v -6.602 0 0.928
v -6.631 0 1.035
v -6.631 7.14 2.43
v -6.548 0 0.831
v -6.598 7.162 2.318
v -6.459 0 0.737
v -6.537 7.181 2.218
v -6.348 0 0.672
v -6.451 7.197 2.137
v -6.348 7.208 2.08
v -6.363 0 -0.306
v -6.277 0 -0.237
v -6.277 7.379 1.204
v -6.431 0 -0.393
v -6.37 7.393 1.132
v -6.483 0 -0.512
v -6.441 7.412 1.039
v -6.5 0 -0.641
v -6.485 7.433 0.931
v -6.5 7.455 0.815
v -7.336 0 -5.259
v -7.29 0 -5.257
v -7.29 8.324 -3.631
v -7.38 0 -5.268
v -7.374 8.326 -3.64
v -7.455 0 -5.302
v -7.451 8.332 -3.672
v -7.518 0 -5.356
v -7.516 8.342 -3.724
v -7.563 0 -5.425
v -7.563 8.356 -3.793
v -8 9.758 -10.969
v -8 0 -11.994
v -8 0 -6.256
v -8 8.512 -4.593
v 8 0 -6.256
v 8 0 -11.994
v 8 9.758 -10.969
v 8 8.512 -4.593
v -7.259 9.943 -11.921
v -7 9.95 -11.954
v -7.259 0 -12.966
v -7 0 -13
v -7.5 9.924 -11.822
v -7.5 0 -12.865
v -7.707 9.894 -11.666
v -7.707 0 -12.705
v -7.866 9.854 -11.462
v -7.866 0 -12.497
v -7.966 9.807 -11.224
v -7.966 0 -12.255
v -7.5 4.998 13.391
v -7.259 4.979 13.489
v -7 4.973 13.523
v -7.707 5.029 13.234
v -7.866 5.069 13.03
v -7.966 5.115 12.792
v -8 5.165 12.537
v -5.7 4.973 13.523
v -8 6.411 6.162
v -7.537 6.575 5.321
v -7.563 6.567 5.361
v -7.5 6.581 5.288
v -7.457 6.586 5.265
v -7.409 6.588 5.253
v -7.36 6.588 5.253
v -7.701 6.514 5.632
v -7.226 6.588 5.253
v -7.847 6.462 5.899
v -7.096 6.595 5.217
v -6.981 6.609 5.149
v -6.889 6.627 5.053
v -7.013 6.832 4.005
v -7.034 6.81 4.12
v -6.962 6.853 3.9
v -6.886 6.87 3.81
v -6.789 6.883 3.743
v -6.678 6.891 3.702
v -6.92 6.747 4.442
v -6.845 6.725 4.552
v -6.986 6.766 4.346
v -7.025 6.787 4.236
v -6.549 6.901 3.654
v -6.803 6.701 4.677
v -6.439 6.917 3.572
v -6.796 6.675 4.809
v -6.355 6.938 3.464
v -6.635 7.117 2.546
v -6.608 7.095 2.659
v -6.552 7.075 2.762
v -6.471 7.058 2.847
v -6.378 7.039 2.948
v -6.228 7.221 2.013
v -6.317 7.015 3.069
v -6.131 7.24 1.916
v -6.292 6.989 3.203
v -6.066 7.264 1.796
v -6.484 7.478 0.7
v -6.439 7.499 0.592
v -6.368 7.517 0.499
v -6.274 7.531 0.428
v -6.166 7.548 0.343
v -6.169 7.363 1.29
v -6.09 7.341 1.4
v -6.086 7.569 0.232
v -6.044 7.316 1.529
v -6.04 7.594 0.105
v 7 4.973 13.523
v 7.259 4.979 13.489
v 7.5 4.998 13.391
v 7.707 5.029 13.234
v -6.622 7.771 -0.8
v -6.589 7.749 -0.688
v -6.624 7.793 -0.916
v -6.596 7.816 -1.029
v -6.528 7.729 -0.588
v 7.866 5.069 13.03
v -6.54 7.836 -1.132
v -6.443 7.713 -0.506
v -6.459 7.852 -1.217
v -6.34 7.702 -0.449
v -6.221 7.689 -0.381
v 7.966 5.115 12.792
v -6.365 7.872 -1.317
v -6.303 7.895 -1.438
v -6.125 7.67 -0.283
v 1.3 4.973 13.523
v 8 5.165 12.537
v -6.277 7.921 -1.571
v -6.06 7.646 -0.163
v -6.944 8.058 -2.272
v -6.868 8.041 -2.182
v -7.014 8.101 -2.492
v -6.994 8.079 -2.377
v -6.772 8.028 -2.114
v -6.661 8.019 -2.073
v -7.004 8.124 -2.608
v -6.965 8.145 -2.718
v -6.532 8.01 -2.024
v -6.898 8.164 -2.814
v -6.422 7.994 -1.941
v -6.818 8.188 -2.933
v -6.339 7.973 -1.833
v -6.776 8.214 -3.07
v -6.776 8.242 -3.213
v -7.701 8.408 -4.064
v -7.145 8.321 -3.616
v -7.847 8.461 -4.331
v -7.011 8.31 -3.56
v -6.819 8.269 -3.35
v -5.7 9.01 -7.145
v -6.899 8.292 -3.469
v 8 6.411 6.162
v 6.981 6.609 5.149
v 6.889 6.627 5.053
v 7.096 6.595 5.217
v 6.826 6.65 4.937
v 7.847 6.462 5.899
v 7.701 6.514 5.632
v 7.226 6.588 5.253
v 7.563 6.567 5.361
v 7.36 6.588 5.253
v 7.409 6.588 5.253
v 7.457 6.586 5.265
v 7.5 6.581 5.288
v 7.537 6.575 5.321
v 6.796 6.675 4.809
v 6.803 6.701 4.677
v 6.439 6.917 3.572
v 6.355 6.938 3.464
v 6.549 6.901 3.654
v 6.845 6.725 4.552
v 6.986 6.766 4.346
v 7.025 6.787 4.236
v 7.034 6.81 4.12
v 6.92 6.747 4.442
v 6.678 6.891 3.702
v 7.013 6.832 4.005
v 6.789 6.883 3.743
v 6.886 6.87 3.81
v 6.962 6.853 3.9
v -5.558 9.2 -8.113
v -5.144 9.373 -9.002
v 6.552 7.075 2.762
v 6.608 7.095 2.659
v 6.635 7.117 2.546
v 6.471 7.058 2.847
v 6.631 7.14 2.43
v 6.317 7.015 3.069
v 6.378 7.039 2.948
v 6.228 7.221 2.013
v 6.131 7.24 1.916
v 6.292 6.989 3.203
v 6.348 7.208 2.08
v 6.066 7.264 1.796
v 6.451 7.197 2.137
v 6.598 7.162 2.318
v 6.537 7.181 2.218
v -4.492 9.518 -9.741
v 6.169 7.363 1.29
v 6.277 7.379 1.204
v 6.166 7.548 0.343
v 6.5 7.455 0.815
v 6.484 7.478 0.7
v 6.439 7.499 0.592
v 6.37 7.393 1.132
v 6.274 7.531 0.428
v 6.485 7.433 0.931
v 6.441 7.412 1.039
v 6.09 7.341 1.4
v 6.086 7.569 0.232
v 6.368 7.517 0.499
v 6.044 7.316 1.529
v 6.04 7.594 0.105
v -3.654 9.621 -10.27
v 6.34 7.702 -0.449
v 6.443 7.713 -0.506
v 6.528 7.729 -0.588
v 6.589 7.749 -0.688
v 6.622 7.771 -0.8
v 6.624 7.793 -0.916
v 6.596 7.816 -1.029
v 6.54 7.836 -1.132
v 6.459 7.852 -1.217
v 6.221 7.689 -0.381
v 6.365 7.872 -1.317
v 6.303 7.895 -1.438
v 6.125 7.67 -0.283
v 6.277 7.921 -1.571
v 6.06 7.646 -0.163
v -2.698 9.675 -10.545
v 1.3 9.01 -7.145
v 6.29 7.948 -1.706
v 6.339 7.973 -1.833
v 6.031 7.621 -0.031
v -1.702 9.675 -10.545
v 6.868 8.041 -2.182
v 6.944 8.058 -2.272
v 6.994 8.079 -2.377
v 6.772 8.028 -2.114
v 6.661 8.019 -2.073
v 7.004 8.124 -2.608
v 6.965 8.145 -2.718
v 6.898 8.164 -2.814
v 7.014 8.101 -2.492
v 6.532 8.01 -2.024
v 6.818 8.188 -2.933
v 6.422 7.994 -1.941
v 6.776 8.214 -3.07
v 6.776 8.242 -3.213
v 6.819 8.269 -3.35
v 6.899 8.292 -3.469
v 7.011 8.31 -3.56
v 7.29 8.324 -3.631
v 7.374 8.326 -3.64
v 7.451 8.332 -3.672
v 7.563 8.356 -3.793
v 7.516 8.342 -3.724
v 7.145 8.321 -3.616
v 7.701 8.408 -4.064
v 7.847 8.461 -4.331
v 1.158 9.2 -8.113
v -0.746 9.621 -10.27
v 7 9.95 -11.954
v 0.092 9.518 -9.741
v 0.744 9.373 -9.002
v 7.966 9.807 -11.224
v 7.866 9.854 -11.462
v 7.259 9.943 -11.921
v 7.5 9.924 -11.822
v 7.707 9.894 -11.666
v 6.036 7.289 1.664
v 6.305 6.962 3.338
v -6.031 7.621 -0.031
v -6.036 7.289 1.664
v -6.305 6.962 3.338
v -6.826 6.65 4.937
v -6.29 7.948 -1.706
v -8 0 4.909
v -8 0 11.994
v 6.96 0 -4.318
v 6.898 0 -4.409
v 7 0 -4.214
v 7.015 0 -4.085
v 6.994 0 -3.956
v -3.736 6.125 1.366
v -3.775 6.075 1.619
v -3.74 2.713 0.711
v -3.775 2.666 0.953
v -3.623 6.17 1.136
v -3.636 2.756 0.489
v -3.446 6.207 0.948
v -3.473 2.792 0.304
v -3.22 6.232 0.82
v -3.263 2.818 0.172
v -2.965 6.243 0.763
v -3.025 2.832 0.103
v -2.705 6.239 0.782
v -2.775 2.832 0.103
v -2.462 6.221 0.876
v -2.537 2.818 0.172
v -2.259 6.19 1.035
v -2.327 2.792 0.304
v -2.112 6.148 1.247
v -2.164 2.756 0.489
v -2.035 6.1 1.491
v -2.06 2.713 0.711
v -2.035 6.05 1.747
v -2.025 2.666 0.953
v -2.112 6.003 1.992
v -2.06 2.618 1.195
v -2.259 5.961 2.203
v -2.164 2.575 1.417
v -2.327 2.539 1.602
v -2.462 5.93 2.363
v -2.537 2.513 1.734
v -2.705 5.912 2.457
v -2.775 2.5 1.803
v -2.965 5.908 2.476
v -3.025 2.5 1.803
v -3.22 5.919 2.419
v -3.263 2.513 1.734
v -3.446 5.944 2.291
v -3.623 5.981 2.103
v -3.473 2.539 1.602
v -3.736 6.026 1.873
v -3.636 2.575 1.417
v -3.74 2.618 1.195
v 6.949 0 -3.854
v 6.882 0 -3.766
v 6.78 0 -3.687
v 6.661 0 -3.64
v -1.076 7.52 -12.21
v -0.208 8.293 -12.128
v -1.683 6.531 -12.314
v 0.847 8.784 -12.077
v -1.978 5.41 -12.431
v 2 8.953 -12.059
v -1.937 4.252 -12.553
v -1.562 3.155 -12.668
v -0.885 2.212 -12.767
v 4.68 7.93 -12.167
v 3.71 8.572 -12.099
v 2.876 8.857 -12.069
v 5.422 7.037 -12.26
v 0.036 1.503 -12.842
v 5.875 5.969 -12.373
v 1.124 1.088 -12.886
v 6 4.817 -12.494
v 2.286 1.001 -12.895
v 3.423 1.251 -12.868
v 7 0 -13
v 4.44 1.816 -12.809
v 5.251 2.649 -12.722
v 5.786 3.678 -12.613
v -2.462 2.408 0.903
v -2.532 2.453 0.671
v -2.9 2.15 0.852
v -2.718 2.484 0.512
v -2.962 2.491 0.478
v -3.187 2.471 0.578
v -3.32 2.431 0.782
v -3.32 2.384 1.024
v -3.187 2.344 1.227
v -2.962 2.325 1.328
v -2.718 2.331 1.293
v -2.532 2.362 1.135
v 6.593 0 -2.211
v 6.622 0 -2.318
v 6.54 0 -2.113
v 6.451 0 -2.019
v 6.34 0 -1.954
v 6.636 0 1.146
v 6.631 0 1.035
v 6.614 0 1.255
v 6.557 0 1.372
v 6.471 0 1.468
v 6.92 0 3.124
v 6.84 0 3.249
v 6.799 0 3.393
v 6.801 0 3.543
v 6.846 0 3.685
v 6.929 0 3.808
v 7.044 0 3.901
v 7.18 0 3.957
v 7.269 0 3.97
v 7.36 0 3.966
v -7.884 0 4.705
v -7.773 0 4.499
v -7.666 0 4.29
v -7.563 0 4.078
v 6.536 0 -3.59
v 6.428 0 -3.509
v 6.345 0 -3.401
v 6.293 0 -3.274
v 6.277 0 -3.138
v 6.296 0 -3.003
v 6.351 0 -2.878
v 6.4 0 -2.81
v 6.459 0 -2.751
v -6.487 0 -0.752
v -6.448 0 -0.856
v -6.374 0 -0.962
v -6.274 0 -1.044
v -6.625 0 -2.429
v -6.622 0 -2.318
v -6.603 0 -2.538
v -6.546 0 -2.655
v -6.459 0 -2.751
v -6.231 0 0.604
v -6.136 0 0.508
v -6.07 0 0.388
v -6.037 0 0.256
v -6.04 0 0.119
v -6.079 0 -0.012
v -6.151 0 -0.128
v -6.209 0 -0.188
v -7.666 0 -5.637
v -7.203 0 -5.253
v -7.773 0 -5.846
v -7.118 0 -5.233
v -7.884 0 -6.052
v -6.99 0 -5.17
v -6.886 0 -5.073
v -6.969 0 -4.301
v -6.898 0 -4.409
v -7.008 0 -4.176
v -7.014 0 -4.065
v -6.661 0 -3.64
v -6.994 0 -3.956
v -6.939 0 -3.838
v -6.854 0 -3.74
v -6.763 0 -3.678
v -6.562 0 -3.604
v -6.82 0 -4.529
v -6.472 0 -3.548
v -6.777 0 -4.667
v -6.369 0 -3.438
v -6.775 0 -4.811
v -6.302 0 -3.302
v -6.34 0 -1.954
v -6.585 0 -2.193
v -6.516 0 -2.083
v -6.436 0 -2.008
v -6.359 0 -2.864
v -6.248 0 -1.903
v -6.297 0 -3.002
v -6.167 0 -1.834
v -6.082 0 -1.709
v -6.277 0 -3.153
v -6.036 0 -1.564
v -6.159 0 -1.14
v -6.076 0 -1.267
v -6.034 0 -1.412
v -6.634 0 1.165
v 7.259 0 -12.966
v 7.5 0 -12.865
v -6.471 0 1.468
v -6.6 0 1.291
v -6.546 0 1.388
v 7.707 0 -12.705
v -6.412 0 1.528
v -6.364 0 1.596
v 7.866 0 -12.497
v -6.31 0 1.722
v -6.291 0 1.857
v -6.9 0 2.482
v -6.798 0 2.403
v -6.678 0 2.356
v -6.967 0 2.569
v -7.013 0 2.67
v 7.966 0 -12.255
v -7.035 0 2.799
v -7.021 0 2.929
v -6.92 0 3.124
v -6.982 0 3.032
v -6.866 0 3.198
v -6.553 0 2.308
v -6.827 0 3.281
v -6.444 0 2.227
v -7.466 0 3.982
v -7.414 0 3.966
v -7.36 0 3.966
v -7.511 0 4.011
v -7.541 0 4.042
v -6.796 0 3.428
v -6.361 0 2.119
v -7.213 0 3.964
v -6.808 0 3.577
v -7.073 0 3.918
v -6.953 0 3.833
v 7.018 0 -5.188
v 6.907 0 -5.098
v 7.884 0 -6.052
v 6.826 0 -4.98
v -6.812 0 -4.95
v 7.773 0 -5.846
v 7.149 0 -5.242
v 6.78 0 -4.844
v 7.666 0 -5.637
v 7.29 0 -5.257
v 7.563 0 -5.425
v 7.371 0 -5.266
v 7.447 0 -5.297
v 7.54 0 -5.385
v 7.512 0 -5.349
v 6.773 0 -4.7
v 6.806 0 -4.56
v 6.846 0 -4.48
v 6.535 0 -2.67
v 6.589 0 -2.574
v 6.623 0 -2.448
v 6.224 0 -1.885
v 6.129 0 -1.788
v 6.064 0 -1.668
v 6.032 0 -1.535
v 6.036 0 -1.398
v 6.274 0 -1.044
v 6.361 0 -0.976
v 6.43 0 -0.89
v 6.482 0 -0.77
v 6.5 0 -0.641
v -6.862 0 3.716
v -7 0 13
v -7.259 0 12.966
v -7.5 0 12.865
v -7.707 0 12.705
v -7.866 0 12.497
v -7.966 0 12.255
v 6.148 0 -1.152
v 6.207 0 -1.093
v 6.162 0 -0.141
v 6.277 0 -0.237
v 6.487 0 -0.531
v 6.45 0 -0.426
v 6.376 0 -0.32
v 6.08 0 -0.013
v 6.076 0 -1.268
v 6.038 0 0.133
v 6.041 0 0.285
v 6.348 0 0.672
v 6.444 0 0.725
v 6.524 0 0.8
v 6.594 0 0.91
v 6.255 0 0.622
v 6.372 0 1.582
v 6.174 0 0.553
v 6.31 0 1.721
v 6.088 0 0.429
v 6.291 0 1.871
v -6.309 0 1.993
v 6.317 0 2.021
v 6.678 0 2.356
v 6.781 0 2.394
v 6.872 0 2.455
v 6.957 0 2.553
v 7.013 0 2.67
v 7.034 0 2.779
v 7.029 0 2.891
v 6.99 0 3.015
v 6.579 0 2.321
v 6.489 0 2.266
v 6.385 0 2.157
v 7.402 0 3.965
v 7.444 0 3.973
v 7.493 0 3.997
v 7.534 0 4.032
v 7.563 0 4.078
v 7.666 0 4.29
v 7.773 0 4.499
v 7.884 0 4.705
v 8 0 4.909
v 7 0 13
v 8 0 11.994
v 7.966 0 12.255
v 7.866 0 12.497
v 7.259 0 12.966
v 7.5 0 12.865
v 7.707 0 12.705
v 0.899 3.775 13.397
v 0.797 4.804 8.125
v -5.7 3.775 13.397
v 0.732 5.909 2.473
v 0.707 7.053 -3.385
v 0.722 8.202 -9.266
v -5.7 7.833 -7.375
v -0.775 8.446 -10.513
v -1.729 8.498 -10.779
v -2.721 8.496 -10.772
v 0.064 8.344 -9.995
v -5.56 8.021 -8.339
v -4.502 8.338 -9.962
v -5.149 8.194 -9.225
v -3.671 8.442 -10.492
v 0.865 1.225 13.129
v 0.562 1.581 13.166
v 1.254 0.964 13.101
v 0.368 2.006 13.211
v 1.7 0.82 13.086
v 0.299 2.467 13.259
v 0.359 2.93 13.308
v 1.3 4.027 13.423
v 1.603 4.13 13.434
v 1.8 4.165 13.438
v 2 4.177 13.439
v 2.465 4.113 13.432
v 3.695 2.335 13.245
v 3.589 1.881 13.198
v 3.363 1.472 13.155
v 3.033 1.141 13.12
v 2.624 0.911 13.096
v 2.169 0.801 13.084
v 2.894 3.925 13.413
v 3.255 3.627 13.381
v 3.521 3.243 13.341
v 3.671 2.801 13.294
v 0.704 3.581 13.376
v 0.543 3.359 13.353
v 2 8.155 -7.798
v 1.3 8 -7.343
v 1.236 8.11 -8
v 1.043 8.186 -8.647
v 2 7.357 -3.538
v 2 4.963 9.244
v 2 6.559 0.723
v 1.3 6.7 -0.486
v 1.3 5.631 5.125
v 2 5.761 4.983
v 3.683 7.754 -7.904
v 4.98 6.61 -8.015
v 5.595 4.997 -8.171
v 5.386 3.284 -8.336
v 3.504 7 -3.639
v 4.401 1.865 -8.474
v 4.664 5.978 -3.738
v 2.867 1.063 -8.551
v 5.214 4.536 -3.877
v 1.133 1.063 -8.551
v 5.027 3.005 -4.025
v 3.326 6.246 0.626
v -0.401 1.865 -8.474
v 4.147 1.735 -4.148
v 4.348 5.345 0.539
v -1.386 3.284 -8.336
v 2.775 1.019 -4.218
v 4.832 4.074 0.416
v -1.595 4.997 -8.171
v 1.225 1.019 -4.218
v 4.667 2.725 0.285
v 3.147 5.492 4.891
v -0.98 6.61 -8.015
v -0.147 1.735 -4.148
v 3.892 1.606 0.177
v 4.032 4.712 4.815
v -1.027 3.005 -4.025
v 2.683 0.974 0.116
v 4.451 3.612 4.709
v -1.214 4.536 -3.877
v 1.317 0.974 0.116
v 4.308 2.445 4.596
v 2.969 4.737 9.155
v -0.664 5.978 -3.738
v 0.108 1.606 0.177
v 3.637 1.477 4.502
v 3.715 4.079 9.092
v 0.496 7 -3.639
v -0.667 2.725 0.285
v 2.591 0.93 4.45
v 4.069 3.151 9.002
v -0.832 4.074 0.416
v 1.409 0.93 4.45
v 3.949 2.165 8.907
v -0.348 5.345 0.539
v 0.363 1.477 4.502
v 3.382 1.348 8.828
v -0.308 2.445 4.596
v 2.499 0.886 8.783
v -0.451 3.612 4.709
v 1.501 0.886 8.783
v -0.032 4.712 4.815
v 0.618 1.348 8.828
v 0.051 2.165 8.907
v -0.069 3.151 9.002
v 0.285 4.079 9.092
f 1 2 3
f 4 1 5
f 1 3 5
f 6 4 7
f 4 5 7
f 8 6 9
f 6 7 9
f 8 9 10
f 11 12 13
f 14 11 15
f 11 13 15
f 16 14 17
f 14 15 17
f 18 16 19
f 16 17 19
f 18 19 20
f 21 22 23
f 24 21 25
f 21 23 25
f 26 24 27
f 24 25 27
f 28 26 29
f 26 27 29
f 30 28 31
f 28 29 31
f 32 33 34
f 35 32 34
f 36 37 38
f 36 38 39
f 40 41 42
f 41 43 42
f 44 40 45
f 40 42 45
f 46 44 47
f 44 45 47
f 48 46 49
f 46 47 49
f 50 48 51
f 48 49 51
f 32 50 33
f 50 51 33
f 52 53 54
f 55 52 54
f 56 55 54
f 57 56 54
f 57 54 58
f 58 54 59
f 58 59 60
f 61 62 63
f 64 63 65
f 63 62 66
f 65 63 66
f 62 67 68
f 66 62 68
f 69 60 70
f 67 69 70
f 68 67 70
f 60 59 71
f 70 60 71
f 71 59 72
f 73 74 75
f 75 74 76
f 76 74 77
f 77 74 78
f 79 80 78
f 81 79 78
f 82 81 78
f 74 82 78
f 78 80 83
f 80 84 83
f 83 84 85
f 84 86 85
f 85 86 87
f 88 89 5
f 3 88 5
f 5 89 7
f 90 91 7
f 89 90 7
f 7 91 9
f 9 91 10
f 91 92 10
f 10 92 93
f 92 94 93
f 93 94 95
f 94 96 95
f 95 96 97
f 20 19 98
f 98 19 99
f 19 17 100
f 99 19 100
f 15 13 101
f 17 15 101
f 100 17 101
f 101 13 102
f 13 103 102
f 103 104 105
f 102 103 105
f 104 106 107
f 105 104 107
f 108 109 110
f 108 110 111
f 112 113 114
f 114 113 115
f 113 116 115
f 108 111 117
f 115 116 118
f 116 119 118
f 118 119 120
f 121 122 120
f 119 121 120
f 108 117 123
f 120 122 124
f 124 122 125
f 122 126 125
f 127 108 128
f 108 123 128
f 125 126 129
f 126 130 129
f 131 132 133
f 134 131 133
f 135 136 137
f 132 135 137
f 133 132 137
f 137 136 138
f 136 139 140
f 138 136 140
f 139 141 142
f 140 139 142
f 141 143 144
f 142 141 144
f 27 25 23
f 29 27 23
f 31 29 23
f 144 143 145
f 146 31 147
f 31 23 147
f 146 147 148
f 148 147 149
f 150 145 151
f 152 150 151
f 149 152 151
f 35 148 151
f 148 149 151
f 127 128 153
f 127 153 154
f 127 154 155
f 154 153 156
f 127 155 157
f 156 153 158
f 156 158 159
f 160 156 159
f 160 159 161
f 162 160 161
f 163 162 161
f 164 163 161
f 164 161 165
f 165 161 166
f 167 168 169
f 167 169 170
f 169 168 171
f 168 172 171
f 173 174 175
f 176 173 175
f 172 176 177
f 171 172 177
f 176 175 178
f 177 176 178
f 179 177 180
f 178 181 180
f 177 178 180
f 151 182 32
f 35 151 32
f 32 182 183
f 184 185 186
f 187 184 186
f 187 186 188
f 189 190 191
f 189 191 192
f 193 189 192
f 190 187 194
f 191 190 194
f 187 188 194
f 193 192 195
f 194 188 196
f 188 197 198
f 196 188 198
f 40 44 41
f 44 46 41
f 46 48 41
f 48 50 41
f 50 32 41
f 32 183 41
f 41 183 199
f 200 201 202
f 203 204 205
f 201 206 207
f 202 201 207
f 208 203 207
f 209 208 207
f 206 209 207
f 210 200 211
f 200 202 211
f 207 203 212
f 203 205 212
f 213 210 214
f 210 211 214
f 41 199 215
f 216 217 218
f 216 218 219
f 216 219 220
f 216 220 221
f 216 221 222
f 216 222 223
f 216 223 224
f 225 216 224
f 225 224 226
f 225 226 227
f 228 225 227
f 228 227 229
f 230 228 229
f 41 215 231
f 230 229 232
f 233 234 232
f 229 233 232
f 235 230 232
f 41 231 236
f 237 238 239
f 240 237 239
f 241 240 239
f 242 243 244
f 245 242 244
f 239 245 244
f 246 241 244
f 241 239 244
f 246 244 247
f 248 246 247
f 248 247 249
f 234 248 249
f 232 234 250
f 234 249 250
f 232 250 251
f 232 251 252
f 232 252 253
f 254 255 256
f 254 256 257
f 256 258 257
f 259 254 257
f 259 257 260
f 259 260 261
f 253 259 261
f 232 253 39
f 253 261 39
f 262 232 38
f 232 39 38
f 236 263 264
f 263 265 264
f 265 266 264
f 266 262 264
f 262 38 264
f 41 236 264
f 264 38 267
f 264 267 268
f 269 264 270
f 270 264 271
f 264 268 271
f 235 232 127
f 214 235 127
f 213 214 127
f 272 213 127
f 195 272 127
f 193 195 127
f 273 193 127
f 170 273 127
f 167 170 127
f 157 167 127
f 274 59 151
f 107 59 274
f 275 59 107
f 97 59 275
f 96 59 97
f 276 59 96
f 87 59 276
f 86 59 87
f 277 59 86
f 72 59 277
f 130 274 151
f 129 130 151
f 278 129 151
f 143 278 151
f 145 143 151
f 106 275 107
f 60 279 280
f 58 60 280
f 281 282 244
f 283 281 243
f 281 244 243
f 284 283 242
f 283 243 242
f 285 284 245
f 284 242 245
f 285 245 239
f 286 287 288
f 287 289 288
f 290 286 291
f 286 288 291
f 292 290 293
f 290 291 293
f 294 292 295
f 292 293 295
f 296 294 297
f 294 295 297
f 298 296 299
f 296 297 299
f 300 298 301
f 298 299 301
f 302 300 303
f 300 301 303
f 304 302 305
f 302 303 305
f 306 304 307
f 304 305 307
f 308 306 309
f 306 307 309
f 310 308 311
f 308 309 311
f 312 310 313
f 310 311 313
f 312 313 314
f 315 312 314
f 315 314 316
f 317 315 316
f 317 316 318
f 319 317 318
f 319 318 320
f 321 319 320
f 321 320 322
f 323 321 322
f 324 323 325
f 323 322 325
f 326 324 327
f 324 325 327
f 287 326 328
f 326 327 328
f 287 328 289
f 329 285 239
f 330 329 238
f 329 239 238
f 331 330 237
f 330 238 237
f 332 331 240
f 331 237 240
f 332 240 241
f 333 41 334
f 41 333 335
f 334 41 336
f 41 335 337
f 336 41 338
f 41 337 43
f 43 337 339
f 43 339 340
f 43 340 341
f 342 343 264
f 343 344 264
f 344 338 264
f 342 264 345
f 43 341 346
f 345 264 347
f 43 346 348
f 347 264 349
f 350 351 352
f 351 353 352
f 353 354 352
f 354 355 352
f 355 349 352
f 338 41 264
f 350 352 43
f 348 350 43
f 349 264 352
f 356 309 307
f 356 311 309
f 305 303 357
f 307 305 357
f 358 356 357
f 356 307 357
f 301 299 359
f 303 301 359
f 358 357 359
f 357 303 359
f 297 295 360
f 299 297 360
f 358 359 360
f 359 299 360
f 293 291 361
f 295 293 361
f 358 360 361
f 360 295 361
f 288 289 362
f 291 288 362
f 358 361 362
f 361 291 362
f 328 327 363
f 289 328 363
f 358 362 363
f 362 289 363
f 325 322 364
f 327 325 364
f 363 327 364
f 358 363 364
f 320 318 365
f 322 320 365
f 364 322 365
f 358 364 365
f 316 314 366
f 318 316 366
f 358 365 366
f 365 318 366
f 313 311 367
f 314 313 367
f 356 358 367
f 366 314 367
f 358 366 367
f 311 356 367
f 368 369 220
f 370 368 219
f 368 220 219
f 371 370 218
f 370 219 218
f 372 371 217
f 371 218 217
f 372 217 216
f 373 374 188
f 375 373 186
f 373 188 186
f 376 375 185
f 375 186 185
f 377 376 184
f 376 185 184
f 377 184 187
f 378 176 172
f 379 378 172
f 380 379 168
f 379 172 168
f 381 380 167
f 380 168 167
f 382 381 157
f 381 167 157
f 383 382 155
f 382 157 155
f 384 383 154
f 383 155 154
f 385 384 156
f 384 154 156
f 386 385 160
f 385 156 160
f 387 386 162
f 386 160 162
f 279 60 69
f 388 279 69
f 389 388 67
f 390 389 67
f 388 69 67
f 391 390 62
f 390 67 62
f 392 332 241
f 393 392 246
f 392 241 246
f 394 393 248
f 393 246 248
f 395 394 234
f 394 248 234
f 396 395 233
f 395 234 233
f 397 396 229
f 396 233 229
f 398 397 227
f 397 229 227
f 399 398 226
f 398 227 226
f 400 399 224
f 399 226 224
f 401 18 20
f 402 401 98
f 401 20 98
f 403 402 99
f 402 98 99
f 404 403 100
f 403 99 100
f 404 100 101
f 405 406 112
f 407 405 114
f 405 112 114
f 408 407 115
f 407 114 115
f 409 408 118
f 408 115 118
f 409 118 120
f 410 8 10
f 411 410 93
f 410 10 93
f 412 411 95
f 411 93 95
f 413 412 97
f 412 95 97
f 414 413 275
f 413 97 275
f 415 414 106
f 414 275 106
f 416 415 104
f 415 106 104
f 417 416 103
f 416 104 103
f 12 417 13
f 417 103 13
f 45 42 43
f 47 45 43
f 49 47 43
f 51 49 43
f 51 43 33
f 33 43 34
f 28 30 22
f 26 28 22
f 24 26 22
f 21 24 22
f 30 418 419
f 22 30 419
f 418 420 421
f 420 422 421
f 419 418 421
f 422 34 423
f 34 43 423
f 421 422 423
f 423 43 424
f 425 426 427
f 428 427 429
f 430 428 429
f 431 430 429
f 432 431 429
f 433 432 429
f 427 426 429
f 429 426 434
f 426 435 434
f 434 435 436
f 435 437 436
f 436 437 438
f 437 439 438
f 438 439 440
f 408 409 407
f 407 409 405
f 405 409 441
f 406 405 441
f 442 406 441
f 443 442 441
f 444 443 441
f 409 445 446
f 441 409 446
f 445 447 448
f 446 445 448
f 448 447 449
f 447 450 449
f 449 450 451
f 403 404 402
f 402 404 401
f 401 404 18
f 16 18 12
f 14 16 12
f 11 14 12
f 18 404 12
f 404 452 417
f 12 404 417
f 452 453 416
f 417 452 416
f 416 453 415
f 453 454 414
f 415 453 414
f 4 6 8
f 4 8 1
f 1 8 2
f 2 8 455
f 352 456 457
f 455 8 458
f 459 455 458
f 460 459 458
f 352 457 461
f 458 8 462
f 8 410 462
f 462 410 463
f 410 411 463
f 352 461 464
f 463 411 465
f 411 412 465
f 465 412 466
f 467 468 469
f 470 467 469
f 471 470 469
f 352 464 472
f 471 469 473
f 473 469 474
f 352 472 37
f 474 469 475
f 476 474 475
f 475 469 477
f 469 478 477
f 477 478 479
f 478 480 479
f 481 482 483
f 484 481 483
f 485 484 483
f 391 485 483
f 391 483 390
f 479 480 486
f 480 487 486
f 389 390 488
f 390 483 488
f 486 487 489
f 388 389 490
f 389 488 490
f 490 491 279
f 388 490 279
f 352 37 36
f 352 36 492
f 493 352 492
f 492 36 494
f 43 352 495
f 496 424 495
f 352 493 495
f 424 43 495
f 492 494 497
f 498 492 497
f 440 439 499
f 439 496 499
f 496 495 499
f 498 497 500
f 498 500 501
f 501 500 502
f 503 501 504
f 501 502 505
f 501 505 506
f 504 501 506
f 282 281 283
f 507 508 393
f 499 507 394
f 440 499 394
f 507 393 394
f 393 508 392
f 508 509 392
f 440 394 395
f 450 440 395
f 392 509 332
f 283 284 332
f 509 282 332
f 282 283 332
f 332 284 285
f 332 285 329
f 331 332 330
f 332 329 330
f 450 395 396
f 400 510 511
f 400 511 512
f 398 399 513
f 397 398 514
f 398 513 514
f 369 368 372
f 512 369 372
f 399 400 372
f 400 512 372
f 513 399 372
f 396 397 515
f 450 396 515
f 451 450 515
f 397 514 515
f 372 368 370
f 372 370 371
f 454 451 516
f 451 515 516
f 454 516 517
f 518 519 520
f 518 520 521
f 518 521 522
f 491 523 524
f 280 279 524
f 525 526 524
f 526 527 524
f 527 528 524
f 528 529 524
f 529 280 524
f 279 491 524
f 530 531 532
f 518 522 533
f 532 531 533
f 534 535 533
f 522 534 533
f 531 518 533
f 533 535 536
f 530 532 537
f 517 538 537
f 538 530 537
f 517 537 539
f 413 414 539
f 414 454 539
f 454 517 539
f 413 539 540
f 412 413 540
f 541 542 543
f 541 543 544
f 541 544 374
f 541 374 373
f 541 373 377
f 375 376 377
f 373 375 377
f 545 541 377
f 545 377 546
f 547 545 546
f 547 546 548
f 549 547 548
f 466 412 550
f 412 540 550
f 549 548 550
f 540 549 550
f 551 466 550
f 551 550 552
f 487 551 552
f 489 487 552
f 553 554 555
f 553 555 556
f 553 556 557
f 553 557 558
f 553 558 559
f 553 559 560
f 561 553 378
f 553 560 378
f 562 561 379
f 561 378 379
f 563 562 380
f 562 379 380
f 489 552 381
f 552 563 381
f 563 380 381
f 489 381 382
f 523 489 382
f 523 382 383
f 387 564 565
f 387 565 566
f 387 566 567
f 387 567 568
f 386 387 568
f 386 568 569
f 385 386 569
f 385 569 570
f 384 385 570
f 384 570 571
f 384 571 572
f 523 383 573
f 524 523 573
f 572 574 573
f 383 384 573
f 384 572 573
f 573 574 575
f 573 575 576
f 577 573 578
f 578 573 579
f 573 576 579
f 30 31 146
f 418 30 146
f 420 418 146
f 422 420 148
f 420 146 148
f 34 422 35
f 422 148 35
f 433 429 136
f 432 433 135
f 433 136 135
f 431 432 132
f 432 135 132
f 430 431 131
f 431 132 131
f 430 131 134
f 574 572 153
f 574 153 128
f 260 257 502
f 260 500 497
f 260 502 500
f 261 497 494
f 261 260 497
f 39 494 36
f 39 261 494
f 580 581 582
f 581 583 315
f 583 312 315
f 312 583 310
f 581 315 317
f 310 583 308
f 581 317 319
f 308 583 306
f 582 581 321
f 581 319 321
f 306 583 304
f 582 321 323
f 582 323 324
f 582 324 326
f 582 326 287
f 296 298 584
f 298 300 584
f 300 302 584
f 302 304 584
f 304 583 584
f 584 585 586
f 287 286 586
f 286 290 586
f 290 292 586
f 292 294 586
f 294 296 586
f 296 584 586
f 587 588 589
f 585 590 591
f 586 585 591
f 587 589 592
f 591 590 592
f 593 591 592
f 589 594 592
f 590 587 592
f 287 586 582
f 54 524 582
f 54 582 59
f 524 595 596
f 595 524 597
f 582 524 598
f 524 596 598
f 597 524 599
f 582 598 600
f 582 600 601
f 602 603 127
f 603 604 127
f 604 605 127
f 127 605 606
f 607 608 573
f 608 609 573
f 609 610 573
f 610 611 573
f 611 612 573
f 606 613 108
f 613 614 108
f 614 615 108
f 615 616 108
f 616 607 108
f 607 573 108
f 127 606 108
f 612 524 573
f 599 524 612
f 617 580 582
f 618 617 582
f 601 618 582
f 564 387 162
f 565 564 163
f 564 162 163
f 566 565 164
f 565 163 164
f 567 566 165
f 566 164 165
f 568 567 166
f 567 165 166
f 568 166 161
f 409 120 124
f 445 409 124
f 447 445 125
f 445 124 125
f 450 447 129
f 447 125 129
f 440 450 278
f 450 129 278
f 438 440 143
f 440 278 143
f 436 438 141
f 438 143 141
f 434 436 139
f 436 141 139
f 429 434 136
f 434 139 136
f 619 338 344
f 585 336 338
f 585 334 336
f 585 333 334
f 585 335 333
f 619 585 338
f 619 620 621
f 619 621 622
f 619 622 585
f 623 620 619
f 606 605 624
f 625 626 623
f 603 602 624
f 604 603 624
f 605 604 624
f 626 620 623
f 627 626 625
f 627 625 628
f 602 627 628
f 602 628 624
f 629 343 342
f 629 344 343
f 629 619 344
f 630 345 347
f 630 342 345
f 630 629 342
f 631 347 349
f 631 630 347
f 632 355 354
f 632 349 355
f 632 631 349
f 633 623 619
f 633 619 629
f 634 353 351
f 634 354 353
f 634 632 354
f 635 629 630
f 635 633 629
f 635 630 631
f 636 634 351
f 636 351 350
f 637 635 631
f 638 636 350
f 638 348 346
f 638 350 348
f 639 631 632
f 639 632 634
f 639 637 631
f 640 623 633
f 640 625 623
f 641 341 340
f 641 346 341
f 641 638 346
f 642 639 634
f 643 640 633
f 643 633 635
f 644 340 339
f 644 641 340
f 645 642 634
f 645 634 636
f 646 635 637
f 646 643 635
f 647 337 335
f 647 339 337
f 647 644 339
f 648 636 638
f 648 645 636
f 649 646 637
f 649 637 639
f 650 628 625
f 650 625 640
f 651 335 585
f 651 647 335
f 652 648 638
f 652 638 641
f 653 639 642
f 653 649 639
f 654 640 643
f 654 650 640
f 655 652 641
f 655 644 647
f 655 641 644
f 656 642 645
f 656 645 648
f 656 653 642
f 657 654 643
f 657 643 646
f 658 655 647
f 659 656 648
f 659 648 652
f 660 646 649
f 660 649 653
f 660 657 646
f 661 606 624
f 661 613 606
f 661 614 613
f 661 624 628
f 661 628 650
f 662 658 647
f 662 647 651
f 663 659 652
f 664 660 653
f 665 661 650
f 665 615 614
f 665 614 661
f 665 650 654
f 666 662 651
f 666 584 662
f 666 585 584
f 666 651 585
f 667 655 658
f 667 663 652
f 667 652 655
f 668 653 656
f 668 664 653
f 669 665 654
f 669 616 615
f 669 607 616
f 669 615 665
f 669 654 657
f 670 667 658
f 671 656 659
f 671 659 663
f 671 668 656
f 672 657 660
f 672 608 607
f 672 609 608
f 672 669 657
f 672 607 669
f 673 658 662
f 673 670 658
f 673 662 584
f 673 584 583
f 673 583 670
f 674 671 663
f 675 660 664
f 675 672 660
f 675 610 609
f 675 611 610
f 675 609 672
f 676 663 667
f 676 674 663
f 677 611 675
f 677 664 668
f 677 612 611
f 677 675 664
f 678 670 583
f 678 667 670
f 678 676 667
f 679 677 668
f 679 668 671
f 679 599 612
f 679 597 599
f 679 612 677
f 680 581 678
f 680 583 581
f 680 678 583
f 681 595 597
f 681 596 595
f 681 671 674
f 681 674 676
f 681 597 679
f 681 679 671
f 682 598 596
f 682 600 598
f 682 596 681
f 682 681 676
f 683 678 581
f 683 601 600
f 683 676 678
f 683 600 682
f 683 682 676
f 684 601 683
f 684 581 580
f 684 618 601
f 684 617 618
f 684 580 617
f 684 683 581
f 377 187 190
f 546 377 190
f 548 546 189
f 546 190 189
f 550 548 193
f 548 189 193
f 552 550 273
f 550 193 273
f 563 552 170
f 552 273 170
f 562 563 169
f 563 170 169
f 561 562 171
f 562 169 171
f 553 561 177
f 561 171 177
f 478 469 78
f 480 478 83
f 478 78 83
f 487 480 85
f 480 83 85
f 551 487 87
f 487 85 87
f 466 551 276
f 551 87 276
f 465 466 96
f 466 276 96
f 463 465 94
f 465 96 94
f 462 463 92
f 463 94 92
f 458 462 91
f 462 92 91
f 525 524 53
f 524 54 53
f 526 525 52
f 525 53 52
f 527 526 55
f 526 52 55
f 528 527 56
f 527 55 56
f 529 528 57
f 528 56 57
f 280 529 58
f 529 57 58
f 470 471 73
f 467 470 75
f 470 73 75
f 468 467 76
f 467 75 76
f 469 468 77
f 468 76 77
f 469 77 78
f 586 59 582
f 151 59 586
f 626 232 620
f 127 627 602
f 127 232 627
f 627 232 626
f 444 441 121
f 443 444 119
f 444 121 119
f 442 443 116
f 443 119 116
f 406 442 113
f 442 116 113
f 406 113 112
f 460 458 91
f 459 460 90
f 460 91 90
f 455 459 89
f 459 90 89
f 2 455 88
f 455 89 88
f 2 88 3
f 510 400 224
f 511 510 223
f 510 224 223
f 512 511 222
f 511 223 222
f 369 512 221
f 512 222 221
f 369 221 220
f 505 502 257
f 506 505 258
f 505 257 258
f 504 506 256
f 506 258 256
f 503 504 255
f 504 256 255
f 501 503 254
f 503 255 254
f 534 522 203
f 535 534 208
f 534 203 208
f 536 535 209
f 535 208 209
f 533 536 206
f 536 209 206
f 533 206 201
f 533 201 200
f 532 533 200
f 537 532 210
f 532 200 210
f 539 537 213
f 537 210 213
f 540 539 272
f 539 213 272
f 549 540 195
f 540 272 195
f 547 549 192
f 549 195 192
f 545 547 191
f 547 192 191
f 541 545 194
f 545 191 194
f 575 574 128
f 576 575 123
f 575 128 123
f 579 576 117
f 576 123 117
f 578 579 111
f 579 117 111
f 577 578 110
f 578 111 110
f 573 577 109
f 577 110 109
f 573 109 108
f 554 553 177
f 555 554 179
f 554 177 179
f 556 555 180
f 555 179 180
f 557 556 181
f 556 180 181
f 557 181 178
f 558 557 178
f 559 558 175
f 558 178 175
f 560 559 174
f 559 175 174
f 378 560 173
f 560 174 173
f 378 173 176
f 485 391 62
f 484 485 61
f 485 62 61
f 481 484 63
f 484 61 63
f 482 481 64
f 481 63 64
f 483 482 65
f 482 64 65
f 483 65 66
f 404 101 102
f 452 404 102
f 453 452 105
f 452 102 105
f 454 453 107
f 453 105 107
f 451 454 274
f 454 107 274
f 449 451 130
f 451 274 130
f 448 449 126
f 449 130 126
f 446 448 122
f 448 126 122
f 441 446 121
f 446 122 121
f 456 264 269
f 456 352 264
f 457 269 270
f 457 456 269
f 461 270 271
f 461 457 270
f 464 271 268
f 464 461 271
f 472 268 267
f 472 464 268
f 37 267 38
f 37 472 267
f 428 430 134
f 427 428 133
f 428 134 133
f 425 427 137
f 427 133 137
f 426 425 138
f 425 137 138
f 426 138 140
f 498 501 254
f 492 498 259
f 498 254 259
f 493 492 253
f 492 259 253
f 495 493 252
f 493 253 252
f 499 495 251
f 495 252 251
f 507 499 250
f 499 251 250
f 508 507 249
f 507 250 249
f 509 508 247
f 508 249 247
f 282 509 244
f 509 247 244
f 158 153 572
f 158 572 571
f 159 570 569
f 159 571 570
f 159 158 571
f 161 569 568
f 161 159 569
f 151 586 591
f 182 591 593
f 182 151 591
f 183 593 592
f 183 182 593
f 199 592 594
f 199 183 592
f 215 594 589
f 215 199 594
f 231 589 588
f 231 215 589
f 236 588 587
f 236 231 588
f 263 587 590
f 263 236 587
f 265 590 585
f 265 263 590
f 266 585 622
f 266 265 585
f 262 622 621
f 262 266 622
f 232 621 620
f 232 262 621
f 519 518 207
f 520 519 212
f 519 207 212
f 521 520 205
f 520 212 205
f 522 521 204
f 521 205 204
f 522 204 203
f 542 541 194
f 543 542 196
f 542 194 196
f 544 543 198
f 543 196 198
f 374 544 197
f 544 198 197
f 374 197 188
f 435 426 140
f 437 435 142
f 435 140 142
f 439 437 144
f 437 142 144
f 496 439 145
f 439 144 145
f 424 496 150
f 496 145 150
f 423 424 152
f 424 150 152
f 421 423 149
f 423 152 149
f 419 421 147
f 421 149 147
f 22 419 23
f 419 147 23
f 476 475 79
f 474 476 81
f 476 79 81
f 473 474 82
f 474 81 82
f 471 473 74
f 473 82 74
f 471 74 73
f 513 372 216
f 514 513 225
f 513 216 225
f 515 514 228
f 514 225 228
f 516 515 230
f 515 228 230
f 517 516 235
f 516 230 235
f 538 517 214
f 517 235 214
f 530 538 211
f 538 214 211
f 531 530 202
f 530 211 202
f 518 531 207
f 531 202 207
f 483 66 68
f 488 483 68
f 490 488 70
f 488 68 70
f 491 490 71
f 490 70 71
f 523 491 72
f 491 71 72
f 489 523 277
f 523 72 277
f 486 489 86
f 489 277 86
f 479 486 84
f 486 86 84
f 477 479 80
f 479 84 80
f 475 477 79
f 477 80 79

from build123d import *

# Parameters (mm, degrees)
BOSS_EXTRUDE1_DEPTH          = 8
CUT_EXTRUDE2_DEPTH           = 1.2
CUT_EXTRUDE3_DEPTH           = 10.965900881
FILLET1_R                    = 1
M2_2X0_45_TAPPED_HOLE1_D     = 1.75
M2_2X0_45_TAPPED_HOLE1_DEPTH = 3.474246958
M2_2X0_45_TAPPED_HOLE1_TIP   = 0.525753042
CUT_EXTRUDE4_DEPTH           = 10.965900881


with BuildPart() as part:
    # Sketch1 → Boss-Extrude1 (new body, symmetric)
    with BuildSketch(Plane(origin=(0, 0, 0), x_dir=(0, 0, -1), z_dir=(1, 0, 0))):
        Polygon((13, 0), (-13, 0), (-13.522642316, 4.972609477), (11.954212859, 9.95), align=None)
    extrude(amount=BOSS_EXTRUDE1_DEPTH, both=True)

    # Sketch2 → Cut-Extrude2 (cut)
    with BuildSketch(Plane(origin=(0, 7.334562502, 1.432946949), x_dir=(1, 0, 0), z_dir=(0, 0.981444969, 0.19174403))):
        with BuildLine():
            Line((-5.7, -12.995337767), (-5.7, 8.740255167))
            ThreePointArc((-5.7, 8.740255167), (-2.2, 12.240255167), (1.3, 8.740255167))
            Line((1.3, 8.740255167), (1.3, -12.995337767))
            Line((1.3, -12.995337767), (-5.7, -12.995337767))
        make_face()
    extrude(amount=-CUT_EXTRUDE2_DEPTH, mode=Mode.SUBTRACT)

    # Sketch5 → Cut-Extrude3 (cut, through all)
    with BuildSketch(Plane(origin=(0, 7.334562502, 1.432946949), x_dir=(1, 0, 0), z_dir=(0, 0.981444969, 0.19174403))):
        with BuildLine():
            Line((-8, 6.140255167), (-8, -4.818261086))
            ThreePointArc((-8, -4.818261086), (-6.5, 0.660997041), (-8, 6.140255167))
        make_face()
        with BuildLine():
            Line((8, 6.140255167), (8, -4.818261086))
            ThreePointArc((8, -4.818261086), (6.5, 0.660997041), (8, 6.140255167))
        make_face()
    extrude(amount=-CUT_EXTRUDE3_DEPTH, mode=Mode.SUBTRACT)

    # Fillet1
    fillet1_edges = [part.edges().sort_by_distance(p)[0] for p in [
        (8, 2.486304738, 13.261321158),
        (8, 4.975, -12.47710643),
        (-8, 2.486304738, 13.261321158),
        (-8, 4.975, -12.47710643),
    ]]
    fillet(fillet1_edges, radius=FILLET1_R)

    # Sketch6 → Cut-Revolve1 (revolve, cut)
    with BuildSketch(Plane(origin=(2, 0, 0), x_dir=(0, 0, -1), z_dir=(1, 0, 0))):
        Polygon((13.04508728, 9.137795416), (-14.42511425, 3.992284126), (-14.282095982, 2.631556203), (-14.256713544, 2.390058443), (13.472498816, 5.071246296), align=None)
    revolve(axis=Axis((2, 2.390058443, 14.256713544), (0, 0.096242959, -0.995357872)), mode=Mode.SUBTRACT)

    # M2.2x0.45 Tapped Hole1
    with Locations(Plane(origin=(0, 6.156828539, 1.202854113), x_dir=(1, 0, 0), z_dir=(0, 0.981444969, 0.19174403))):
        with Locations((-2.9, -0.424399477)):
            Hole(M2_2X0_45_TAPPED_HOLE1_D / 2, depth=M2_2X0_45_TAPPED_HOLE1_DEPTH)
            with Locations((0, 0, -(M2_2X0_45_TAPPED_HOLE1_DEPTH + M2_2X0_45_TAPPED_HOLE1_TIP / 2))):  # 118° drill point
                Cone(0, M2_2X0_45_TAPPED_HOLE1_D / 2, M2_2X0_45_TAPPED_HOLE1_TIP, mode=Mode.SUBTRACT)

    # Sketch9 → Cut-Extrude4 (cut, through all)
    with BuildSketch(Plane(origin=(0, 7.334562502, 1.432946949), x_dir=(1, 0, 0), z_dir=(0, 0.981444969, 0.19174403))):
        with BuildLine():
            ThreePointArc((-7.289795354, 5.159702376), (-7.451242382, 5.201326159), (-7.563470071, 5.324625097))
            ThreePointArc((-7.563470071, 5.324625097), (-7.252547552, 4.613795693), (-6.993667337, 3.882405038))
            ThreePointArc((-6.993667337, 3.882405038), (-7.004481287, 4.117448052), (-6.897853081, 4.327192148))
            ThreePointArc((-6.897853081, 4.327192148), (-6.818575776, 4.873033057), (-7.289795354, 5.159702376))
        make_face()
        with BuildLine():
            ThreePointArc((-6.660871352, 3.572142615), (-6.868230387, 3.683337889), (-6.993667337, 3.882405038))
            ThreePointArc((-6.993667337, 3.882405038), (-6.776841479, 3.085777587), (-6.621748536, 2.274867649))
            ThreePointArc((-6.621748536, 2.274867649), (-6.596489986, 2.508799625), (-6.459039737, 2.69976976))
            ThreePointArc((-6.459039737, 2.69976976), (-6.289708944, 3.198480265), (-6.660871352, 3.572142615))
        make_face()
        with BuildLine():
            ThreePointArc((-6.340315921, 1.917360153), (-6.528230594, 2.05895899), (-6.621748536, 2.274867649))
            ThreePointArc((-6.621748536, 2.274867649), (-6.529302038, 1.454451661), (-6.500046516, 0.629362053))
            ThreePointArc((-6.500046516, 0.629362053), (-6.439309701, 0.856679466), (-6.274271086, 1.024382842))
            ThreePointArc((-6.274271086, 1.024382842), (-6.030663985, 1.491331089), (-6.340315921, 1.917360153))
        make_face()
        with BuildLine():
            ThreePointArc((-6.2765983, 0.23302027), (-6.440647698, 0.401691388), (-6.500046516, 0.629362053))
            ThreePointArc((-6.500046516, 0.629362053), (-6.534154287, -0.195541178), (-6.631424447, -1.015399212))
            ThreePointArc((-6.631424447, -1.015399212), (-6.536638256, -0.80004432), (-6.347894026, -0.659553155))
            ThreePointArc((-6.347894026, -0.659553155), (-6.035741762, -0.235352673), (-6.2765983, 0.23302027))
        make_face()
        with BuildLine():
            ThreePointArc((-6.47121752, -1.441250956), (-6.607542206, -1.249475706), (-6.631424447, -1.015399212))
            ThreePointArc((-6.631424447, -1.015399212), (-6.791284069, -1.825382978), (-7.012791541, -2.620721422))
            ThreePointArc((-7.012791541, -2.620721422), (-6.886185953, -2.422395441), (-6.678176493, -2.312421653))
            ThreePointArc((-6.678176493, -2.312421653), (-6.304822815, -1.940948752), (-6.47121752, -1.441250956))
        make_face()
        with BuildLine():
            ThreePointArc((-6.919594936, -3.066064322), (-7.024987686, -2.855696746), (-7.012791541, -2.620721422))
            ThreePointArc((-7.012791541, -2.620721422), (-7.264215038, -3.321206437), (-7.563470071, -4.002631015))
            ThreePointArc((-7.563470071, -4.002631015), (-7.47948201, -3.914560625), (-7.359806711, -3.892465134))
            ThreePointArc((-7.359806711, -3.892465134), (-6.85334699, -3.631801278), (-6.919594936, -3.066064322))
        make_face()
        with BuildLine():
            ThreePointArc((7.563470071, -4.002631015), (7.264215036, -3.321206432), (7.012791537, -2.620721412))
            ThreePointArc((7.012791537, -2.620721412), (7.024987687, -2.855696741), (6.919594936, -3.066064322))
            ThreePointArc((6.919594936, -3.066064322), (6.85334699, -3.631801278), (7.359806711, -3.892465134))
            ThreePointArc((7.359806711, -3.892465134), (7.47948201, -3.914560625), (7.563470071, -4.002631015))
        make_face()
        with BuildLine():
            ThreePointArc((7.012791537, -2.620721412), (6.791284072, -1.825382992), (6.631424452, -1.01539925))
            ThreePointArc((6.631424452, -1.01539925), (6.607542199, -1.249475724), (6.47121752, -1.441250956))
            ThreePointArc((6.47121752, -1.441250956), (6.304822815, -1.940948752), (6.678176493, -2.312421653))
            ThreePointArc((6.678176493, -2.312421653), (6.886185949, -2.422395438), (7.012791537, -2.620721412))
        make_face()
        with BuildLine():
            ThreePointArc((6.631424452, -1.01539925), (6.534154286, -0.195541171), (6.500046515, 0.629362105))
            ThreePointArc((6.500046515, 0.629362105), (6.440647711, 0.401691411), (6.2765983, 0.23302027))
            ThreePointArc((6.2765983, 0.23302027), (6.035741762, -0.235352673), (6.347894026, -0.659553155))
            ThreePointArc((6.347894026, -0.659553155), (6.536638268, -0.800044334), (6.631424452, -1.01539925))
        make_face()
        with BuildLine():
            ThreePointArc((6.500046515, 0.629362105), (6.52930204, 1.454451696), (6.621748538, 2.274867666))
            ThreePointArc((6.621748538, 2.274867666), (6.528230599, 2.058958996), (6.340315921, 1.917360153))
            ThreePointArc((6.340315921, 1.917360153), (6.030663985, 1.491331089), (6.274271086, 1.024382842))
            ThreePointArc((6.274271086, 1.024382842), (6.439309688, 0.856679489), (6.500046515, 0.629362105))
        make_face()
        with BuildLine():
            ThreePointArc((6.621748538, 2.274867666), (6.776841483, 3.085777604), (6.993667342, 3.882405056))
            ThreePointArc((6.993667342, 3.882405056), (6.868230394, 3.683337895), (6.660871352, 3.572142615))
            ThreePointArc((6.660871352, 3.572142615), (6.289708944, 3.198480265), (6.459039737, 2.69976976))
            ThreePointArc((6.459039737, 2.69976976), (6.596489983, 2.508799632), (6.621748538, 2.274867666))
        make_face()
        with BuildLine():
            ThreePointArc((7.563470071, 5.324625097), (7.451242382, 5.201326159), (7.289795354, 5.159702376))
            ThreePointArc((7.289795354, 5.159702376), (6.818575776, 4.873033057), (6.897853081, 4.327192148))
            ThreePointArc((6.897853081, 4.327192148), (7.004481285, 4.117448061), (6.993667342, 3.882405056))
            ThreePointArc((6.993667342, 3.882405056), (7.252547555, 4.613795701), (7.563470071, 5.324625097))
        make_face()
    extrude(amount=-CUT_EXTRUDE4_DEPTH, mode=Mode.SUBTRACT)


solid = part.part
